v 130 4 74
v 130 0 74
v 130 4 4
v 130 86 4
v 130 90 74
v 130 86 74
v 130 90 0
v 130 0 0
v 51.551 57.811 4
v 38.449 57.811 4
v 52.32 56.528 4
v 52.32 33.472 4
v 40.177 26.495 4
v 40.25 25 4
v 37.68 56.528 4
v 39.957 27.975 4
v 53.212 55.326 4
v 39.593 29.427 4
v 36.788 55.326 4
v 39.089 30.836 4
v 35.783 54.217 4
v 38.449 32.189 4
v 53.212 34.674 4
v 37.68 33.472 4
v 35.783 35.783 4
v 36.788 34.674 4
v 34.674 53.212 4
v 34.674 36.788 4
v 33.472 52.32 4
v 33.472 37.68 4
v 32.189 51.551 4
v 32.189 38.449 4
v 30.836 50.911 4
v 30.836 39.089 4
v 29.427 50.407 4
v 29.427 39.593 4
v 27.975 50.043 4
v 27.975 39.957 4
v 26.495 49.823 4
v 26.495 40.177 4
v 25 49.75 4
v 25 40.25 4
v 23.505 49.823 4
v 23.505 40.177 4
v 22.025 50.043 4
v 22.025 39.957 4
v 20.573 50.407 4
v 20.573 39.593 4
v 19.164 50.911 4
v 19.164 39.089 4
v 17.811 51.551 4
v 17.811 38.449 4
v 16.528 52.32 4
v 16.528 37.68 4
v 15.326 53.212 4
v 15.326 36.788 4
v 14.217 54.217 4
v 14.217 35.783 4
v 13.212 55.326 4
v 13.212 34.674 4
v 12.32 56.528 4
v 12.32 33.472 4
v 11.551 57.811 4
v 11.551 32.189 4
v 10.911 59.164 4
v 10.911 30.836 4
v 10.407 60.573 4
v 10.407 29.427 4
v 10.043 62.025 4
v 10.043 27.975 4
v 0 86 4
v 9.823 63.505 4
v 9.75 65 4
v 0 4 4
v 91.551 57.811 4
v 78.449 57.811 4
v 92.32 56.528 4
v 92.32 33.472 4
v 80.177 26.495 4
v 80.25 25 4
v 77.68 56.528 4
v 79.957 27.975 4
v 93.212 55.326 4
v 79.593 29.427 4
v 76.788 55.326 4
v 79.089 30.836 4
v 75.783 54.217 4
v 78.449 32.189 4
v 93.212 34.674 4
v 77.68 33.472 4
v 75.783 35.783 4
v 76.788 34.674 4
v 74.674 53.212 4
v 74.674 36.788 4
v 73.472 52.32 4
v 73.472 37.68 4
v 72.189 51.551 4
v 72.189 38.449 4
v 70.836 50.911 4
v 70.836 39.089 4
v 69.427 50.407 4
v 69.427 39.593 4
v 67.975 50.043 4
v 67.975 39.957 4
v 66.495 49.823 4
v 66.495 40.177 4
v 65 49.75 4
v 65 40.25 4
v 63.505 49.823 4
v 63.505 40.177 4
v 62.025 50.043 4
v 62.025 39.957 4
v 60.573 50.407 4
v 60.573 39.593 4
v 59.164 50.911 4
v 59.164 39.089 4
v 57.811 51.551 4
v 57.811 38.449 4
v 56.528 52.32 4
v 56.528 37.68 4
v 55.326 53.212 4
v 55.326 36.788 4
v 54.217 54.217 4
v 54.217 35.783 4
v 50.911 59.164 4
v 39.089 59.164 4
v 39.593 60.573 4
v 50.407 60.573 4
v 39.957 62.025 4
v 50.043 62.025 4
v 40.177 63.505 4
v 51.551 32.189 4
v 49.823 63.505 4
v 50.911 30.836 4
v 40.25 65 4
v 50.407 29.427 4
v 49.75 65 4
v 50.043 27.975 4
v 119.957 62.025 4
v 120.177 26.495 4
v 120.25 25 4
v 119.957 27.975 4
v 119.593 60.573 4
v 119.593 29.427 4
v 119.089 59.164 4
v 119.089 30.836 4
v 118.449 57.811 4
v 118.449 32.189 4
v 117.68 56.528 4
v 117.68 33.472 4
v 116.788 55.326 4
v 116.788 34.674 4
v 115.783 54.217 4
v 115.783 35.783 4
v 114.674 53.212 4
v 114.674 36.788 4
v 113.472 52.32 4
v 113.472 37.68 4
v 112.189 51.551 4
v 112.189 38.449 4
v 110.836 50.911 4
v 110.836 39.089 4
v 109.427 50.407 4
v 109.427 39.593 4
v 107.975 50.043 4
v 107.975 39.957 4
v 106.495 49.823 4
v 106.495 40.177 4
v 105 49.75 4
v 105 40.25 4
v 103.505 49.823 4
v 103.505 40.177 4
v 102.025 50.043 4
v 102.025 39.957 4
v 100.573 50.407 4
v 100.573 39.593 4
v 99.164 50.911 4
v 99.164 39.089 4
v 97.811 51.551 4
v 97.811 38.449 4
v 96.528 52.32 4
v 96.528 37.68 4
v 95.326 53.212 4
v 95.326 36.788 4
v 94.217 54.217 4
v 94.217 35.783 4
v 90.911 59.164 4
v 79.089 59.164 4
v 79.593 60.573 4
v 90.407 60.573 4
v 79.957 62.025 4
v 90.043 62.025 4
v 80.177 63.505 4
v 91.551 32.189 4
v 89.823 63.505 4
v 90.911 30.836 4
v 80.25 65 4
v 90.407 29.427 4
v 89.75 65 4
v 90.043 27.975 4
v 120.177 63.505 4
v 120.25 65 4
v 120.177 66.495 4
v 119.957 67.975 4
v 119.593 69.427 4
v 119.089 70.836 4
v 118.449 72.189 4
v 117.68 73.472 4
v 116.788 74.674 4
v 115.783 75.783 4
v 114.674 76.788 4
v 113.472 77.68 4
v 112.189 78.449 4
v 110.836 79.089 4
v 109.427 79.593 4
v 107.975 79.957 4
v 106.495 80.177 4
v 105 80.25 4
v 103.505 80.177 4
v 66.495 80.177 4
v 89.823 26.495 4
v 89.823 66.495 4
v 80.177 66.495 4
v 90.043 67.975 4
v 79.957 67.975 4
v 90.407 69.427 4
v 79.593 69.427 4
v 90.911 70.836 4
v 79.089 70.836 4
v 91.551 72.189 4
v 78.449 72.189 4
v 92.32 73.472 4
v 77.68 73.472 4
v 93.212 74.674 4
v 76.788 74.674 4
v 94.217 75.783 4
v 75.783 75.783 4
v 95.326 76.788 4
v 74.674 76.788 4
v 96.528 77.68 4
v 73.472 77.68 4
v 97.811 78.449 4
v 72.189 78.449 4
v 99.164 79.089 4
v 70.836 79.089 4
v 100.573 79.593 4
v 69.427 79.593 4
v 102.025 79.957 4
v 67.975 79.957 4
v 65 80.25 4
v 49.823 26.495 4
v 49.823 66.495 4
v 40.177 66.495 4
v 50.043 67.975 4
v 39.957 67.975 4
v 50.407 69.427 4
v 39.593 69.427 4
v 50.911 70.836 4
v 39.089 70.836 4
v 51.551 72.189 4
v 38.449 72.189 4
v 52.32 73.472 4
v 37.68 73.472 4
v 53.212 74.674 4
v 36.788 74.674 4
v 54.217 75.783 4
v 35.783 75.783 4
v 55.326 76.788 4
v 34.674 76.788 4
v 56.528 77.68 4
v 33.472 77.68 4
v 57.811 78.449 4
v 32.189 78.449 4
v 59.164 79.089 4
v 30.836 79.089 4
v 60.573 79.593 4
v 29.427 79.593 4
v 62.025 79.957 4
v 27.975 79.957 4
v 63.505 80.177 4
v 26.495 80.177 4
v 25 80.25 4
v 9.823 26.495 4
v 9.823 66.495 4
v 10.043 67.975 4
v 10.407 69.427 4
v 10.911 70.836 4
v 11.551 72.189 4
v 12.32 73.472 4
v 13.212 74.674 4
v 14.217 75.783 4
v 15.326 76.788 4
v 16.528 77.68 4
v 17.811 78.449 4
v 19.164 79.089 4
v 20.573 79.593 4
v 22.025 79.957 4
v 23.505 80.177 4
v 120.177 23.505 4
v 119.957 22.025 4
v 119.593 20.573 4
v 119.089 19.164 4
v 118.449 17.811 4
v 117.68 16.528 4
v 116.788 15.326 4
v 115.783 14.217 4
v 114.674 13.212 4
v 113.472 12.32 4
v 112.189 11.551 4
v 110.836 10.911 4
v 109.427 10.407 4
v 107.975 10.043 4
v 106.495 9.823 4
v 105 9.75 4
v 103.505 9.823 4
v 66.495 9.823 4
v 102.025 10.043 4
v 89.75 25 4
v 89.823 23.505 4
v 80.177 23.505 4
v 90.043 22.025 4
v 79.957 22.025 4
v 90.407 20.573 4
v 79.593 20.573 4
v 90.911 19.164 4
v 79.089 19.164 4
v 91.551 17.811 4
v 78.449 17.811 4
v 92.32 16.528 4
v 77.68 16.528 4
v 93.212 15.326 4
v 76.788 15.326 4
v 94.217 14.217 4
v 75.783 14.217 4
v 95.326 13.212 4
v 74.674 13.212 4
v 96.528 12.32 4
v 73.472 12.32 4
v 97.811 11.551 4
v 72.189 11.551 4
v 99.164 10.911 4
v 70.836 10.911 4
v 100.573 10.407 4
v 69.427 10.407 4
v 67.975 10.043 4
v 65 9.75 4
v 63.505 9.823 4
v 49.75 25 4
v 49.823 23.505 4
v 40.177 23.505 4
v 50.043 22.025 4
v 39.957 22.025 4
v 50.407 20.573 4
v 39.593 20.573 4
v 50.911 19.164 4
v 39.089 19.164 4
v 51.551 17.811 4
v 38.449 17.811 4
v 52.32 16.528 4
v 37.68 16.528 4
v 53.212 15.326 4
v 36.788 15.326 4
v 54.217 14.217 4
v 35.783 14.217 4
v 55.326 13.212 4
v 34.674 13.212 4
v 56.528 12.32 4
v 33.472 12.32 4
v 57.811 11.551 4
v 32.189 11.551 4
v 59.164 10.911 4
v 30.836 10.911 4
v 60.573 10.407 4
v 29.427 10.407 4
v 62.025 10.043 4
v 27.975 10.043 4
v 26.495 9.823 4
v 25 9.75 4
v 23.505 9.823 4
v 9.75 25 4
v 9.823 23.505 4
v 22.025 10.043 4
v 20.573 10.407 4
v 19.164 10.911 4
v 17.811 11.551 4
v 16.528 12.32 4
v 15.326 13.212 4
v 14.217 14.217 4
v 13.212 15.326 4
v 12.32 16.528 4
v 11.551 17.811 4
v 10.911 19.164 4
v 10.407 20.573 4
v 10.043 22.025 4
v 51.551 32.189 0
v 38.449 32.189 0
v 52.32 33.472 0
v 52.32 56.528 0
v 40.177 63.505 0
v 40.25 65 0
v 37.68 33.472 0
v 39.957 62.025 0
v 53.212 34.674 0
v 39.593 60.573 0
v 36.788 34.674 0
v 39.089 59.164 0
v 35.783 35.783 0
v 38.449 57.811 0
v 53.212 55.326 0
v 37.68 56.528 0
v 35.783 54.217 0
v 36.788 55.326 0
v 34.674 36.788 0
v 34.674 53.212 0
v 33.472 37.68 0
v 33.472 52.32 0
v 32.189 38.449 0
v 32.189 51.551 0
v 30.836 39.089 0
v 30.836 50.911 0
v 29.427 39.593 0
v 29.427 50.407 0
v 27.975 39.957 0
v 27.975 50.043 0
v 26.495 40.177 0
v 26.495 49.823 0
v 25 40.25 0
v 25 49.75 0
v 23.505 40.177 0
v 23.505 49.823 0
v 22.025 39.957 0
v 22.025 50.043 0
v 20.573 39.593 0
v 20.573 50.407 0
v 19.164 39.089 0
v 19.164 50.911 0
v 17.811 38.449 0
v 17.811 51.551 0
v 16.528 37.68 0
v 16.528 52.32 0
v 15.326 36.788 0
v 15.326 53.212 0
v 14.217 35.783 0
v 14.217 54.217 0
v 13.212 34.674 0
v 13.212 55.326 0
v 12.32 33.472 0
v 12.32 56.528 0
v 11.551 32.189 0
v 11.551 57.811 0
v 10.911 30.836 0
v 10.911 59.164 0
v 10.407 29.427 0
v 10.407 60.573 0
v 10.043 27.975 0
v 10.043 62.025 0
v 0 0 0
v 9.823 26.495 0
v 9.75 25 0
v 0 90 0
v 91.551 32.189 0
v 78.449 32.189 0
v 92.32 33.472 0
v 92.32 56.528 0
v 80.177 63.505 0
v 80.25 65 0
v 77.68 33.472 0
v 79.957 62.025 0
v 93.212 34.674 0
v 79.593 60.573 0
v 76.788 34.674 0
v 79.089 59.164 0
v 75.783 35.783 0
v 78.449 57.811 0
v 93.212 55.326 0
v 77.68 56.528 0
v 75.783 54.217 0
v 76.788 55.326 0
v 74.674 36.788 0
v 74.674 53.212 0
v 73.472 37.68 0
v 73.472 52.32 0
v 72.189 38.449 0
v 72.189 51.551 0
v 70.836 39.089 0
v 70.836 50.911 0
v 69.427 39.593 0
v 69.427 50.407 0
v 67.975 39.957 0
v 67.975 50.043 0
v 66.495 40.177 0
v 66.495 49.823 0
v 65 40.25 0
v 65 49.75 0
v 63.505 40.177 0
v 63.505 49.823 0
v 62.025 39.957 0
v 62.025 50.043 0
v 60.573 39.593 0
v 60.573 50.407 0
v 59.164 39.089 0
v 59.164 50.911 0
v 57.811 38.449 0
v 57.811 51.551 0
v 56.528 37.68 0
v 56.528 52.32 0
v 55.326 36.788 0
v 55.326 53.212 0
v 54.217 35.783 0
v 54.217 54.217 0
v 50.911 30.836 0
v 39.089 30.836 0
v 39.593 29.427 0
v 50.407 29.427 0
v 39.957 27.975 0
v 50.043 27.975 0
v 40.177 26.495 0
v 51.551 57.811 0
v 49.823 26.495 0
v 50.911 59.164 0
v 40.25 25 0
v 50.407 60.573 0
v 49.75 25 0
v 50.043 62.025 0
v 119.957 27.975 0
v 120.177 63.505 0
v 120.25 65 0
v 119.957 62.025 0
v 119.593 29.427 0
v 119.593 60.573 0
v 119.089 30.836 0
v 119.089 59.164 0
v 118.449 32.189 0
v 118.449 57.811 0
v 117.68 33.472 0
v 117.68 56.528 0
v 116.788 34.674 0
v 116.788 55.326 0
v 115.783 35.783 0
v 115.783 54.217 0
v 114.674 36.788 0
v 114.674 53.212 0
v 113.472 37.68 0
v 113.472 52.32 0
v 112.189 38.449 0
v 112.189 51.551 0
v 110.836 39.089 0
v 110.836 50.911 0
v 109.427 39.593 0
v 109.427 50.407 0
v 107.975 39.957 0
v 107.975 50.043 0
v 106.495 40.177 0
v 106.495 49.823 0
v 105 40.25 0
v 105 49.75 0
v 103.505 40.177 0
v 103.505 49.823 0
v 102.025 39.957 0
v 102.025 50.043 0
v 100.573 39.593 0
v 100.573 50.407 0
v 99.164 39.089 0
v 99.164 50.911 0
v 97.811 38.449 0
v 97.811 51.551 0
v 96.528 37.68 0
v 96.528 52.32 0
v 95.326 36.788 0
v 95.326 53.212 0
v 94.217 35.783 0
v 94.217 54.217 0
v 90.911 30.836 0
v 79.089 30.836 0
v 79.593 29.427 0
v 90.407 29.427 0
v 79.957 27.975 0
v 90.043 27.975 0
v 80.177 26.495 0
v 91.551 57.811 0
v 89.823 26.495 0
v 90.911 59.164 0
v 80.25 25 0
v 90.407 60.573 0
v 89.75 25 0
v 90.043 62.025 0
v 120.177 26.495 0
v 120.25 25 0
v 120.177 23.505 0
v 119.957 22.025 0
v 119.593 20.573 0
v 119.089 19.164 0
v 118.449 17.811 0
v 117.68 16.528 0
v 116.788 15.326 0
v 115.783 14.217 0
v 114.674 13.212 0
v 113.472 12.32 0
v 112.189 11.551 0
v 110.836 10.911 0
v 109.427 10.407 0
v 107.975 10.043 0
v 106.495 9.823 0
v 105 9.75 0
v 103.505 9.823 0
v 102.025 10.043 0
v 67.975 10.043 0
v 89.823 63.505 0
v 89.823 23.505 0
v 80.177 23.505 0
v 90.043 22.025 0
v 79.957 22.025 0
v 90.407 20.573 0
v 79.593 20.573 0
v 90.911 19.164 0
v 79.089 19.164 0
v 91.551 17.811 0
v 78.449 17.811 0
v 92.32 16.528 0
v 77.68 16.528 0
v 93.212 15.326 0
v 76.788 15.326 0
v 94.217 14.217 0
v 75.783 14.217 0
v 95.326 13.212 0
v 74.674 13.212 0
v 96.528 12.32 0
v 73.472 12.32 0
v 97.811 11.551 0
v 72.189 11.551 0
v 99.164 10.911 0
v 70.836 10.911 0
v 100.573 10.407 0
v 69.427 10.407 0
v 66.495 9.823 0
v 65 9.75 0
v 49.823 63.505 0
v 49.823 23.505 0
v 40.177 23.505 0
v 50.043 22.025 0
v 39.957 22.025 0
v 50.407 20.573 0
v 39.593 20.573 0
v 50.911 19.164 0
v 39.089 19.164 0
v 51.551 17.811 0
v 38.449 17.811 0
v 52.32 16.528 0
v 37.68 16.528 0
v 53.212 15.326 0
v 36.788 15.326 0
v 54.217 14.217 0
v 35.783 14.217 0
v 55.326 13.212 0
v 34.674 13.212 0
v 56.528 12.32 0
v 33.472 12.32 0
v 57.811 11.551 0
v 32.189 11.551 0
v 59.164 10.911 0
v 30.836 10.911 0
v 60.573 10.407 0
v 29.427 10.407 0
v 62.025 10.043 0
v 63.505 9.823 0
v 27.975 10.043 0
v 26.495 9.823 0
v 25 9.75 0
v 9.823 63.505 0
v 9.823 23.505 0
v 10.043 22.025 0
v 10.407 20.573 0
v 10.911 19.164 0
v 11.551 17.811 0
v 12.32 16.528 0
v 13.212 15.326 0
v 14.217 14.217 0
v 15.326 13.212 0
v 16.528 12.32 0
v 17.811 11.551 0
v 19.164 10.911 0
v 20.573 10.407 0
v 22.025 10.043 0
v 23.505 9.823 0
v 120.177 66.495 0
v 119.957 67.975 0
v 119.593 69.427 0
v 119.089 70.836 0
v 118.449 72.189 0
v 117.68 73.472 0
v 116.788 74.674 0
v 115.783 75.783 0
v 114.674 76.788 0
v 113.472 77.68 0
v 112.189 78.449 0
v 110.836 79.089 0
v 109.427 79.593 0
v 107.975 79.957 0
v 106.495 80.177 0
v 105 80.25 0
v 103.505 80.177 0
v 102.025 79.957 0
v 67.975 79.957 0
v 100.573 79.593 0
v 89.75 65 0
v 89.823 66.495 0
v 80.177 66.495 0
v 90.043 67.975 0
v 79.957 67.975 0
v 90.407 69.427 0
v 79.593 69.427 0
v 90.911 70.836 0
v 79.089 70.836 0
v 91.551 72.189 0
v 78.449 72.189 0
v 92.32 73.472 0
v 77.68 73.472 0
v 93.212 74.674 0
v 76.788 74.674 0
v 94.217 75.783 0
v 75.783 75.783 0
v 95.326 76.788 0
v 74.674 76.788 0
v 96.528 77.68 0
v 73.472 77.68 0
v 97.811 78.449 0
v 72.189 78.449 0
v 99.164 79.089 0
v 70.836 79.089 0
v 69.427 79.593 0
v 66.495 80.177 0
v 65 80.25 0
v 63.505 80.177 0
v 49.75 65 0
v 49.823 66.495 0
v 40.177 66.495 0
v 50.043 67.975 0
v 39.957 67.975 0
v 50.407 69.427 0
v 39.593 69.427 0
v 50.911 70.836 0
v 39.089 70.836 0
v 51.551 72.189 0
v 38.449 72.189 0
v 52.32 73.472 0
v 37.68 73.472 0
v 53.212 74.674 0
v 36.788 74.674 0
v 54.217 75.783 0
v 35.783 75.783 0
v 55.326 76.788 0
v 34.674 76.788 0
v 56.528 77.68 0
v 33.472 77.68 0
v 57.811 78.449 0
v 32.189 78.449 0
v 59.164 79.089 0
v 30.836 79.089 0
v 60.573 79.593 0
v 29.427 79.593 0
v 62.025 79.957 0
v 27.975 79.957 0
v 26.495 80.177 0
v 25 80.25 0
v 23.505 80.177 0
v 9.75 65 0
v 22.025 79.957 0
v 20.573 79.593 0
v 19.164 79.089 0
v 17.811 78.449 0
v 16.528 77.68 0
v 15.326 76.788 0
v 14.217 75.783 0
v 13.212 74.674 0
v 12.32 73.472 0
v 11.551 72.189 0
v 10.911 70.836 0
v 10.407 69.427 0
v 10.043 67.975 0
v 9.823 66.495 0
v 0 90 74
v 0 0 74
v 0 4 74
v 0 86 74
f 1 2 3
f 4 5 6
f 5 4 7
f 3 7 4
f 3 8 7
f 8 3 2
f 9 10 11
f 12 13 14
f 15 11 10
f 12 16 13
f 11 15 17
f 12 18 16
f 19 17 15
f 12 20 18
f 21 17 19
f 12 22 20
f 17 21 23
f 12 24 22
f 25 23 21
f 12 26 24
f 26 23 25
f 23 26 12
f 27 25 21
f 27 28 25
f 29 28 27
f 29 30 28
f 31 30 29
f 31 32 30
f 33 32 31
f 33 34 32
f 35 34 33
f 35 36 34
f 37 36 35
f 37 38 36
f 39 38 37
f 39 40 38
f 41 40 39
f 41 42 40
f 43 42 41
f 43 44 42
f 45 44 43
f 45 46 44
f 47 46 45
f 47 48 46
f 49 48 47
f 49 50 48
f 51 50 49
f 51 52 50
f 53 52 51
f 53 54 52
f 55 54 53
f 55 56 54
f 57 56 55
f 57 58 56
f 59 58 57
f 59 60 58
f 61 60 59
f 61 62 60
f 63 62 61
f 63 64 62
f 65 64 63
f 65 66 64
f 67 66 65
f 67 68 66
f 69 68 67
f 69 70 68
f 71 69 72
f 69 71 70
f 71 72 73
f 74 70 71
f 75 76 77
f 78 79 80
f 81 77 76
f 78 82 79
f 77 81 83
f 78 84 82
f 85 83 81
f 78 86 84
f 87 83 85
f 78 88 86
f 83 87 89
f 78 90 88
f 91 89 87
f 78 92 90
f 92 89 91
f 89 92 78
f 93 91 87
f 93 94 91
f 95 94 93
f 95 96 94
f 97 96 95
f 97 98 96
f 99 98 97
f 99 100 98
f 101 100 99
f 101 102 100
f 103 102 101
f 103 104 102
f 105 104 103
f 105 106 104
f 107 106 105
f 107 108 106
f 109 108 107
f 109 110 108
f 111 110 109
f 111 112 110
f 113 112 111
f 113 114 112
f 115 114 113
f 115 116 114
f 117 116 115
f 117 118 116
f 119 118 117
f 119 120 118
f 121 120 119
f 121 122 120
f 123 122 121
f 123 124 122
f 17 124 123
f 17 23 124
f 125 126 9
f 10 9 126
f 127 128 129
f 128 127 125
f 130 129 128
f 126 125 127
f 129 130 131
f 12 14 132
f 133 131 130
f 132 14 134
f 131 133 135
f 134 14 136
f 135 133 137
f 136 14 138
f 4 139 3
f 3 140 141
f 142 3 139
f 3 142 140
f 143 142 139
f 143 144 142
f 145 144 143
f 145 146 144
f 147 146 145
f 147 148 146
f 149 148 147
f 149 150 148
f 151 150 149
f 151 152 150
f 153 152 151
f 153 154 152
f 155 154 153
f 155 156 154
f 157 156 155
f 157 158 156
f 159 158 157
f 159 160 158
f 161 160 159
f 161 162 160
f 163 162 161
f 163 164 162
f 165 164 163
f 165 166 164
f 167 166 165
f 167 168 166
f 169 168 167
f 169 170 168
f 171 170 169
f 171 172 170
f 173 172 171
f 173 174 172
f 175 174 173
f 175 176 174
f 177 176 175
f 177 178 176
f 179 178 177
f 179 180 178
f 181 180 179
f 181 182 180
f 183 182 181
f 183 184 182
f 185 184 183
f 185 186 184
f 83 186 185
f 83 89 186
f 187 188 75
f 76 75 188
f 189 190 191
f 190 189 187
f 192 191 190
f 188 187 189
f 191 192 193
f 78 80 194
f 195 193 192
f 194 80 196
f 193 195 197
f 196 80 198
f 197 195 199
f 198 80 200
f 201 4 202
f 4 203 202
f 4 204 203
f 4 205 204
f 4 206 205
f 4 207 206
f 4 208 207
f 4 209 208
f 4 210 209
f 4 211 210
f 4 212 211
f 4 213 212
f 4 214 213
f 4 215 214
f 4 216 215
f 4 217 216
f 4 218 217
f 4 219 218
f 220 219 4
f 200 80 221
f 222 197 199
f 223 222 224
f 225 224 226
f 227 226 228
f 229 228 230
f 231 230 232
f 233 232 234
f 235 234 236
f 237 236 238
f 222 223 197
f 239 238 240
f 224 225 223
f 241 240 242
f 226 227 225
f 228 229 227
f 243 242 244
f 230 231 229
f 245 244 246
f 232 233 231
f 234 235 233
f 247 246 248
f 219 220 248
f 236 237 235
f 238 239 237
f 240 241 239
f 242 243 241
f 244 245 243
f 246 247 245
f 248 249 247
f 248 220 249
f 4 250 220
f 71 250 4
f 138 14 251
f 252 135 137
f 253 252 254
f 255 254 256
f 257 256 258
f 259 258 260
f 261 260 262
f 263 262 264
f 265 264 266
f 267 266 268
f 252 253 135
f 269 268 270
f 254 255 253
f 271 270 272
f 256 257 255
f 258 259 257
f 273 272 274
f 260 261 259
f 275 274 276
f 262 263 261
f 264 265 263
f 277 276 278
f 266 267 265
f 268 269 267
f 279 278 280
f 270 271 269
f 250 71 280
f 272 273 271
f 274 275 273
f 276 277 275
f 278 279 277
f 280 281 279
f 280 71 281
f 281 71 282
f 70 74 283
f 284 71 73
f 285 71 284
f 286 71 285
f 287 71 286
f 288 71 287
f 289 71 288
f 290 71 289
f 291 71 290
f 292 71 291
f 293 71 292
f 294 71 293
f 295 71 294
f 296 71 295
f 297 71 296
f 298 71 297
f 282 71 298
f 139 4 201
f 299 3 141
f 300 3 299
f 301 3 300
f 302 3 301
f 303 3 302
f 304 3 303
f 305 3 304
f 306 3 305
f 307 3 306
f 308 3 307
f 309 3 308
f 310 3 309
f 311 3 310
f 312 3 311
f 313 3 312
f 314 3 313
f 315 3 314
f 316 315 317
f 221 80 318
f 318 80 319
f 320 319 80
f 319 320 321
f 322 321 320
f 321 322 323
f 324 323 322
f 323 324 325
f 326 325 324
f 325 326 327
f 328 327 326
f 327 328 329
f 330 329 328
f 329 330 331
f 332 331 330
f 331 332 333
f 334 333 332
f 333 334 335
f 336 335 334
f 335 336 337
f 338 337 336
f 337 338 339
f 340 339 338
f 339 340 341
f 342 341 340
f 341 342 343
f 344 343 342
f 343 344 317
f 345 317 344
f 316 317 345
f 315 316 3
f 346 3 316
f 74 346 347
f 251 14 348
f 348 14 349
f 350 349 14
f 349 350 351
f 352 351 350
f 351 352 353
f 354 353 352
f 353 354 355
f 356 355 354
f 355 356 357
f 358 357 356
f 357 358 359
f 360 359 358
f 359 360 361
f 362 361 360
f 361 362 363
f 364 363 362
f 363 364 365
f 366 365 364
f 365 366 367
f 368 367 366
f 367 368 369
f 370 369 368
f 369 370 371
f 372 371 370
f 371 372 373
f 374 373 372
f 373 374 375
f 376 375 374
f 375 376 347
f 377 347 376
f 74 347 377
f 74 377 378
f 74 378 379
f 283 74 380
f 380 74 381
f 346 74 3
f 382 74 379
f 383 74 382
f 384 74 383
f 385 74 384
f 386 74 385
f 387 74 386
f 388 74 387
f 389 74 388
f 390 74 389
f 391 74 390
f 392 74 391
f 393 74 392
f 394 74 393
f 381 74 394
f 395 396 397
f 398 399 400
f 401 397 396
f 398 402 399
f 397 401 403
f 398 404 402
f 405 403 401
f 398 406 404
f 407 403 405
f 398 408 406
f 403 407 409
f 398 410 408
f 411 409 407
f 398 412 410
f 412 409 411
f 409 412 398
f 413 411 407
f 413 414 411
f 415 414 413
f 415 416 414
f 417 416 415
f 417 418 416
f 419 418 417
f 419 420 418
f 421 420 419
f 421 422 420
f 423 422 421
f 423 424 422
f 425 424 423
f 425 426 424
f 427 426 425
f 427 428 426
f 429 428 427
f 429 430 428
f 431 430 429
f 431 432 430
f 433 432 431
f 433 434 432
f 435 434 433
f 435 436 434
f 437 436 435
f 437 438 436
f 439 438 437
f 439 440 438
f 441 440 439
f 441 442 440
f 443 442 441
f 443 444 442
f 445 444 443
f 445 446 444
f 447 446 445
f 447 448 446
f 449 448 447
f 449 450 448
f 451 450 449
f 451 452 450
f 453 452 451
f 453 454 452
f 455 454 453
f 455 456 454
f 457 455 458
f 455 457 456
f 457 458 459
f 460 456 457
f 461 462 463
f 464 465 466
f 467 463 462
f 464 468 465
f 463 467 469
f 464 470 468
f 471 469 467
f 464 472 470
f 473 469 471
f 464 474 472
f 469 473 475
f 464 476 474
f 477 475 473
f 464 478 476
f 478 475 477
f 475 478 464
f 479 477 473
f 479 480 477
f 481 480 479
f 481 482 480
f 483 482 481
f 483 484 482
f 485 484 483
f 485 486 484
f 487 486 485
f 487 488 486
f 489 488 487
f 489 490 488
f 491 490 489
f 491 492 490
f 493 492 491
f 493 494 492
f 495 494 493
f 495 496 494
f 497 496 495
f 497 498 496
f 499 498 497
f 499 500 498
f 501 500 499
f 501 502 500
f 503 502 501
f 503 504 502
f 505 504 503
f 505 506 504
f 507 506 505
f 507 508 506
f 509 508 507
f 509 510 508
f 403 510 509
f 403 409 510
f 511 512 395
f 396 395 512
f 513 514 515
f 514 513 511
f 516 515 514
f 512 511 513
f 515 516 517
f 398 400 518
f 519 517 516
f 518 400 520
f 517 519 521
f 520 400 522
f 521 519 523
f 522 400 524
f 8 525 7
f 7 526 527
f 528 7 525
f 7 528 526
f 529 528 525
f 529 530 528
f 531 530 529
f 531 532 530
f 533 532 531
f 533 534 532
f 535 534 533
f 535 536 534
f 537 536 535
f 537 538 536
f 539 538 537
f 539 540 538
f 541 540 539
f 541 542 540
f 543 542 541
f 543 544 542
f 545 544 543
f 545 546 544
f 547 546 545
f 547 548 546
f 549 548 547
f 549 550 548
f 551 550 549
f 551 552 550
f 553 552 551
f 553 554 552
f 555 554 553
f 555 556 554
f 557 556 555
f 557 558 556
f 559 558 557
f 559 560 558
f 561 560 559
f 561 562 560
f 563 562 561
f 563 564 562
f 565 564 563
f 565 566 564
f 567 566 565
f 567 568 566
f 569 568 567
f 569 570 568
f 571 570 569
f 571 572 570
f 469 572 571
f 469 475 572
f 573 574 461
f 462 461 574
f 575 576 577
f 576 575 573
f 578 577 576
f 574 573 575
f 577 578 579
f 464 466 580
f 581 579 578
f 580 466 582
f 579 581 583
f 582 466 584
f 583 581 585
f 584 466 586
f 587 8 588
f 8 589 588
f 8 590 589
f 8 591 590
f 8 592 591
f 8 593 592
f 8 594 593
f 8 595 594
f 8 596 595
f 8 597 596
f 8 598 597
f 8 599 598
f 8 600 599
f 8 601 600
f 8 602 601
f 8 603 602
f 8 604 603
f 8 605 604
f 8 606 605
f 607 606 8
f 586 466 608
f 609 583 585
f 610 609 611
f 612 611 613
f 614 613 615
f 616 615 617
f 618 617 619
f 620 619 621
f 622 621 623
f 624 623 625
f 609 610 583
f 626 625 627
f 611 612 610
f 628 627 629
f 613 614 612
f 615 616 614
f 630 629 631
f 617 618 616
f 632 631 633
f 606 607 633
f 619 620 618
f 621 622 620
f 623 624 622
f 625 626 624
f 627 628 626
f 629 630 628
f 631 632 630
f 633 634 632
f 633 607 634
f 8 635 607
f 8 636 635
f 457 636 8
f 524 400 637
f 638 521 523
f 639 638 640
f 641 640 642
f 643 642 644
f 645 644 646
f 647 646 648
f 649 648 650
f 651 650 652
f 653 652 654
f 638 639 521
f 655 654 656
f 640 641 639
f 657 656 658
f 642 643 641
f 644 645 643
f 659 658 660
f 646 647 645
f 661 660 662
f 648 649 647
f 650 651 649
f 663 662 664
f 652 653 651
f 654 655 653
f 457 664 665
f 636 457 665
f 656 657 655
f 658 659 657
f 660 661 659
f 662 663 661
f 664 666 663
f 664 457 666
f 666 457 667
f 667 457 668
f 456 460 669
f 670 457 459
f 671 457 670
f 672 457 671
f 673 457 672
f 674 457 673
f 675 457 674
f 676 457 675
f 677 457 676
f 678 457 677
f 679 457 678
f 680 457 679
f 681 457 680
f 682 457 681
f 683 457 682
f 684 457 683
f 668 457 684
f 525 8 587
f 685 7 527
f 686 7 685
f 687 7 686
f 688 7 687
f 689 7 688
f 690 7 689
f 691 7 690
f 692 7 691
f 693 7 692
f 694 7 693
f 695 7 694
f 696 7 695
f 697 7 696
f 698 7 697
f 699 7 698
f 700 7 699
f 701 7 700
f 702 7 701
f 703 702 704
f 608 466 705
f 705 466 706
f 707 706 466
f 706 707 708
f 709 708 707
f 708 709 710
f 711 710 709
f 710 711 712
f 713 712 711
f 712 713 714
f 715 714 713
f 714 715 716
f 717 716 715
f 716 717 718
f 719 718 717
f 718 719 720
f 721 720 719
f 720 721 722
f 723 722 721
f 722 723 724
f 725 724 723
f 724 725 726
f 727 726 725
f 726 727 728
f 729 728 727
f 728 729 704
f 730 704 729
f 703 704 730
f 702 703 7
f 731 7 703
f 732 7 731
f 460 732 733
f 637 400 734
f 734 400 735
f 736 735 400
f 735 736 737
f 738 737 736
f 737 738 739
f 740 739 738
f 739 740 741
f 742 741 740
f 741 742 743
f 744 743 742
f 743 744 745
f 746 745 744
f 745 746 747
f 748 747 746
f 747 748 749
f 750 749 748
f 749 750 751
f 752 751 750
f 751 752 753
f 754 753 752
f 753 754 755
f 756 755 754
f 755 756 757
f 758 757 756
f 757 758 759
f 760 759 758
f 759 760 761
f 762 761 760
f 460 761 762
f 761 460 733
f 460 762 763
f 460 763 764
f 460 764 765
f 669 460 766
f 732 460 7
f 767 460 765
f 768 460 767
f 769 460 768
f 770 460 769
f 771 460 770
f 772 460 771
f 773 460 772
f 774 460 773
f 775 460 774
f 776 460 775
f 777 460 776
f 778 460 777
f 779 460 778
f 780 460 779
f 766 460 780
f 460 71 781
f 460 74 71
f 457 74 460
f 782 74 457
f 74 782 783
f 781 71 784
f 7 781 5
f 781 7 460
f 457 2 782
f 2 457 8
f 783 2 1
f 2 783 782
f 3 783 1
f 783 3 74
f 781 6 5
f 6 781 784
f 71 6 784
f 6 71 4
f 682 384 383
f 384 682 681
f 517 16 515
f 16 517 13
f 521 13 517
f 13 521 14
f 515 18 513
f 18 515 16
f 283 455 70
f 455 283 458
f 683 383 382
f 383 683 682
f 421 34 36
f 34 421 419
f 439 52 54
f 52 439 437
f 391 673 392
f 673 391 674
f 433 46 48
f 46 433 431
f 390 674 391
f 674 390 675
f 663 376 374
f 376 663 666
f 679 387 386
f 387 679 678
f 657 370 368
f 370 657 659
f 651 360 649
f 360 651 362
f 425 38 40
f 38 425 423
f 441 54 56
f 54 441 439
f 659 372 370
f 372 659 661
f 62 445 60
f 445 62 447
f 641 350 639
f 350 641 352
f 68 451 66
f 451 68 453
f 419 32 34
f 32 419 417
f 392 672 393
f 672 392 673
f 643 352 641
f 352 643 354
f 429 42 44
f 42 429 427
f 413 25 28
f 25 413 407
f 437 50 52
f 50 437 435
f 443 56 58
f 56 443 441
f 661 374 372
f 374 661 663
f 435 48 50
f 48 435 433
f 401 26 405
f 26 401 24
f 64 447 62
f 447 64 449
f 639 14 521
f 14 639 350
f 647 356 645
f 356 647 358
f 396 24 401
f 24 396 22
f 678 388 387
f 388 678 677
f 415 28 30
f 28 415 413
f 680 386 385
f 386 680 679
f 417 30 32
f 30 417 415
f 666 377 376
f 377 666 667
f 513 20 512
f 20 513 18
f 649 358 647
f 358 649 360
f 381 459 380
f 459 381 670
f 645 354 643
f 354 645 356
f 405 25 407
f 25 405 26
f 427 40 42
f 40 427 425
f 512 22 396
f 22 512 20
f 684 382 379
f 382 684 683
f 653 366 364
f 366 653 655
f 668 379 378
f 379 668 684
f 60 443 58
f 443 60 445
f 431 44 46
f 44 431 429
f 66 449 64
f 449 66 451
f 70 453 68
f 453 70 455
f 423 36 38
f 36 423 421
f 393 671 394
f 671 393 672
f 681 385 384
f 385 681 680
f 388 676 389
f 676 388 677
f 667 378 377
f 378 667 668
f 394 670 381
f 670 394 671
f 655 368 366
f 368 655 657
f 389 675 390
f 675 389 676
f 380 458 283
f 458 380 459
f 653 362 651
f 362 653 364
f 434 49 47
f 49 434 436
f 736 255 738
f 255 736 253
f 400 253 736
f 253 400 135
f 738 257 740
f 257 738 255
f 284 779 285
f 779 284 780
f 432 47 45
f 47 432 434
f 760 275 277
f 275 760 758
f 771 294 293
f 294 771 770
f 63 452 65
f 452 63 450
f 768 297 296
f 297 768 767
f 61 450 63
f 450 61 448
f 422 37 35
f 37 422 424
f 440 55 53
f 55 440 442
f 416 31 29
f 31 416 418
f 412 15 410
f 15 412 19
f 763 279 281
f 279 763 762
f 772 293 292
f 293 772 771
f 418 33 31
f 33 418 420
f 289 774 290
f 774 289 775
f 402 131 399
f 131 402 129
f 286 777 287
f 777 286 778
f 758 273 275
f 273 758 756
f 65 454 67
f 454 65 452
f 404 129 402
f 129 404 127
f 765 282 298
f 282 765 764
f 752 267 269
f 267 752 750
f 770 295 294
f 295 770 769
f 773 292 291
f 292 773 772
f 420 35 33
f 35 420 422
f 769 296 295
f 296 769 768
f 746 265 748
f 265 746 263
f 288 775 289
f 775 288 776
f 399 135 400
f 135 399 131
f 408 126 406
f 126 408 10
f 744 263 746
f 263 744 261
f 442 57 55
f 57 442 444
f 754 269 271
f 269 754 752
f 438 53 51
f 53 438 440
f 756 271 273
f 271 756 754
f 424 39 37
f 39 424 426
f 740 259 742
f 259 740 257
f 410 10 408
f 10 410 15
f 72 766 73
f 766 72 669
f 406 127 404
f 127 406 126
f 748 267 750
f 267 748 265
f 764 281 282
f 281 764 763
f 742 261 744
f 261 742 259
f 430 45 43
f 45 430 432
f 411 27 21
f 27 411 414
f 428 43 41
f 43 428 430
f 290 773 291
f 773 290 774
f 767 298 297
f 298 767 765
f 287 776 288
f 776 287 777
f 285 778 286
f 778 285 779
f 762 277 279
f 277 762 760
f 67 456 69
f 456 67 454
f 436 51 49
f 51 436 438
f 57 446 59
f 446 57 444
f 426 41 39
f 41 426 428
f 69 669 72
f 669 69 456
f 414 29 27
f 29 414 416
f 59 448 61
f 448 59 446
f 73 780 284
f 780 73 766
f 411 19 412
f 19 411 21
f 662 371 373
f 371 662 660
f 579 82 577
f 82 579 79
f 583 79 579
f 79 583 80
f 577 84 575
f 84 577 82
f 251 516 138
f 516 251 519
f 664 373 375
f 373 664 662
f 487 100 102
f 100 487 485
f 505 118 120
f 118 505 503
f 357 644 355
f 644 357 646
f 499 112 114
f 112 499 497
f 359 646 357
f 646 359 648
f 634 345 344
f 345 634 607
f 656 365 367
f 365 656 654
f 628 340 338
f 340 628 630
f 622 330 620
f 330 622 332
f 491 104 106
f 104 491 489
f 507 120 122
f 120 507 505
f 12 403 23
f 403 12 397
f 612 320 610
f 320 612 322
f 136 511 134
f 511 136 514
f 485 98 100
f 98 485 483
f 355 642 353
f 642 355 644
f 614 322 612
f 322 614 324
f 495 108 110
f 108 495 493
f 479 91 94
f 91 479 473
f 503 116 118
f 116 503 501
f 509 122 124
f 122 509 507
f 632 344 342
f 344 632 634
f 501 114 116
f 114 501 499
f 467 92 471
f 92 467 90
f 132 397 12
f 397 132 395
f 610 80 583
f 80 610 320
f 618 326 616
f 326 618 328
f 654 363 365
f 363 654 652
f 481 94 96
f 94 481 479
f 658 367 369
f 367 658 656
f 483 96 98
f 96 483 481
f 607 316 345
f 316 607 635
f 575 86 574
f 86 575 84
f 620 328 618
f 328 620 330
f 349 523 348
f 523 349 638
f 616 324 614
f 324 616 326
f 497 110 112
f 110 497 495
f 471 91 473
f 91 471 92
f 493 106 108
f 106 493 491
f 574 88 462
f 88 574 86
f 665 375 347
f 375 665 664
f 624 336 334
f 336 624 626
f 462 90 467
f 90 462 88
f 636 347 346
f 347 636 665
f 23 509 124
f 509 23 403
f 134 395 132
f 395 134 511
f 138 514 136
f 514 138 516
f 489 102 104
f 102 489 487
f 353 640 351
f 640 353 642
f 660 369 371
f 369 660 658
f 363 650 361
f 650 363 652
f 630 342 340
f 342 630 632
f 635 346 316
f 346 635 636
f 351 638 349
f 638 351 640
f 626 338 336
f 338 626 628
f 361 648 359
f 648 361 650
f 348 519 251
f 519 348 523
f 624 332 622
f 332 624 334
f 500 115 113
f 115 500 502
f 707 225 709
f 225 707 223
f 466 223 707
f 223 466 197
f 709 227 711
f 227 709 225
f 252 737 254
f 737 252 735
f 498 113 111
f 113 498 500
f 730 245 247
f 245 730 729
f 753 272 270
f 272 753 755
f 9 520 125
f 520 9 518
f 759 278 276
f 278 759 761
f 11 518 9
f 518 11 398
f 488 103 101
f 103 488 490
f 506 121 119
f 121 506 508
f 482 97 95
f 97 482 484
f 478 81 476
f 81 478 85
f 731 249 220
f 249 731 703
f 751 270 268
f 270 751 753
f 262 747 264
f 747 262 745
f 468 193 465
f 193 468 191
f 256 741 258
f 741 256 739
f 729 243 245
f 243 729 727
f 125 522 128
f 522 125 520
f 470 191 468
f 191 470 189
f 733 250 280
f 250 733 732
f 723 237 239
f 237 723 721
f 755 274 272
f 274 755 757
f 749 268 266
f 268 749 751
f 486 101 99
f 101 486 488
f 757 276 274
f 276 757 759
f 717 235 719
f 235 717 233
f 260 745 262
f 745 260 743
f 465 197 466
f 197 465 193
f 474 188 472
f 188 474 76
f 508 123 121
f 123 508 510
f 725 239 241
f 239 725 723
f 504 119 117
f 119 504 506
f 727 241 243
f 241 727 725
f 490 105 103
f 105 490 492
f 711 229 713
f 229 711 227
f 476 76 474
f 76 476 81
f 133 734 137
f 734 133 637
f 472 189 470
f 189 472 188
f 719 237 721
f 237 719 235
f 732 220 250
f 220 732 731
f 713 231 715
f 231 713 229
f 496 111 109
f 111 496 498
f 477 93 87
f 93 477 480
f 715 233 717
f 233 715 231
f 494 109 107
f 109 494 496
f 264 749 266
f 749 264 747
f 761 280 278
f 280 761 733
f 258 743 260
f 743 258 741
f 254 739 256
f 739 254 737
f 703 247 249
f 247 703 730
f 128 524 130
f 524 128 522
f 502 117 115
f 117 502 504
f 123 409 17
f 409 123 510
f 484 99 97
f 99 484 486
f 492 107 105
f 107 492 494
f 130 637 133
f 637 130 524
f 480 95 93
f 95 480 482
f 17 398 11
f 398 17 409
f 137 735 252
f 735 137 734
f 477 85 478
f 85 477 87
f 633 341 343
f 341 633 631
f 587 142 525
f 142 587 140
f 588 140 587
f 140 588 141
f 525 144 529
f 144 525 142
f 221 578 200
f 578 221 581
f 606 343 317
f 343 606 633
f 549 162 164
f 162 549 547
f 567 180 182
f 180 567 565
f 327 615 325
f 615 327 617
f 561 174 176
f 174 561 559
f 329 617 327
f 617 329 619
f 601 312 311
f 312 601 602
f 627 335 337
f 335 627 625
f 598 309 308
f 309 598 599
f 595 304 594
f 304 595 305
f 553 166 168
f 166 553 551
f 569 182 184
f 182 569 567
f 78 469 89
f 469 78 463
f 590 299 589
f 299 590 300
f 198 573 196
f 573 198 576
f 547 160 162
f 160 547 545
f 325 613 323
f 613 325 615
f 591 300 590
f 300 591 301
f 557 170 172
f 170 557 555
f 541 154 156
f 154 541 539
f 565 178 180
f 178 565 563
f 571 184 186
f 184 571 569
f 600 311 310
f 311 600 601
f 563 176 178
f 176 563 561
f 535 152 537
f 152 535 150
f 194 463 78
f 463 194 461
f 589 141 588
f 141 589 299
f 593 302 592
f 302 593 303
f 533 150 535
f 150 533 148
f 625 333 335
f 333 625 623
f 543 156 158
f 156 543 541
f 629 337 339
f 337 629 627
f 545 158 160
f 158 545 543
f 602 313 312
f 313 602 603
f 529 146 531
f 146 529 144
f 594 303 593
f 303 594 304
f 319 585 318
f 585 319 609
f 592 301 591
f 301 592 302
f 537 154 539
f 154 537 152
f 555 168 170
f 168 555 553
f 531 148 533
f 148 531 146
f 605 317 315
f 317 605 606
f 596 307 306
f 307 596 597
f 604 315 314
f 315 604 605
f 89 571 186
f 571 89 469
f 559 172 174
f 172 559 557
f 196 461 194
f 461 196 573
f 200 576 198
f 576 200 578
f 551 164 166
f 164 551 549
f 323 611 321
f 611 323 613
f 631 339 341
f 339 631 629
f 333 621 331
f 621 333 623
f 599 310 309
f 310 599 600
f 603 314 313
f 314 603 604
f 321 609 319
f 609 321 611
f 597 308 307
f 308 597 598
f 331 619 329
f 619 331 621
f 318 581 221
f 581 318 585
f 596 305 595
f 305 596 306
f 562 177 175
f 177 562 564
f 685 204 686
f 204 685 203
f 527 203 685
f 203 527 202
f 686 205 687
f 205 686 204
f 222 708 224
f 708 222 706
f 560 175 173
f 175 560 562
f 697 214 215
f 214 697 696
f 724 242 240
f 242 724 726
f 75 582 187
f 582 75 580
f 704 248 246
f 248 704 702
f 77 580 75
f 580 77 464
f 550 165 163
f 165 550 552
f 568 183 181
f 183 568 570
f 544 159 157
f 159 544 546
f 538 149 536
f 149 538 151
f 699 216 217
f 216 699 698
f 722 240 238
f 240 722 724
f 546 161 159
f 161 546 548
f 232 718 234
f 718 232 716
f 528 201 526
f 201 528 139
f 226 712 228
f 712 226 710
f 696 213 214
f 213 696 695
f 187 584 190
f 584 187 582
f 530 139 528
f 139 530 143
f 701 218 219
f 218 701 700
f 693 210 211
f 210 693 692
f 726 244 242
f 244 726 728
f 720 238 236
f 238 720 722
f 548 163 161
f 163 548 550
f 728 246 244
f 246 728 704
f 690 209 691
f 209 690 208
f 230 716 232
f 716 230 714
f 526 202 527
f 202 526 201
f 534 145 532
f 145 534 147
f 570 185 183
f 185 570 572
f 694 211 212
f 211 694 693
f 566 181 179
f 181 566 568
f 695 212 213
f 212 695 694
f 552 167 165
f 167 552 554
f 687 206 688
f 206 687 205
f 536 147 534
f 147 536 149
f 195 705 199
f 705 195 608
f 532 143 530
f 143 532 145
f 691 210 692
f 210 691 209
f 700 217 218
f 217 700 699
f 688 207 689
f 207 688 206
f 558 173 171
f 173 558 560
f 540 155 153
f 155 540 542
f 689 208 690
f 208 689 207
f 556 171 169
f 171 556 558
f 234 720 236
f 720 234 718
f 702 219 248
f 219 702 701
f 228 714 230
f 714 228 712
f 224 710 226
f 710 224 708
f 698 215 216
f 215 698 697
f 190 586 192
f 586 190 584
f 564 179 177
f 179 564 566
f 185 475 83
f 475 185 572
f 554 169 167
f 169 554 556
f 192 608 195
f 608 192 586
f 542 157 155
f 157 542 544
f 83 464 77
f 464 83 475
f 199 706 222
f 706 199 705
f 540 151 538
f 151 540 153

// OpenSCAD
// --- Dimensions (mm) ---
plate_width = 130;          // X dimension of the base plate
plate_depth = 90;           // Y dimension of the base plate
plate_thickness = 4;        // Thickness of the base plate
wall_height = 70;           // Height of the side walls from the plate
wall_thickness = 4;         // Thickness of the side walls
hole_diameter = 30.5;       // Diameter of the tube holes
hole_spacing_x = 40;        // Center-to-center distance along X
hole_spacing_y = 40;        // Center-to-center distance along Y
num_holes_x = 3;            // Number of holes along X axis
num_holes_y = 2;            // Number of holes along Y axis

// --- Resolution ---
$fn = 64;

// --- Construction ---

// The part is designed to be printed "upside down" relative to its final use.
// In print orientation: 
// The plate is at Z=0 to Z=4.
// The walls rise from Z=4 to Z=74 (4 + 70).
// The holes are cut through the plate.

module tube_rack() {
    difference() {
        // Main Body: The plate and the two side walls
        union() {
            // The Base Plate
            cube([plate_width, plate_depth, plate_thickness]);
            
            // Wall 1 (along one long edge)
            // Positioned at Y=0 to Y=4
            translate([0, 0, plate_thickness])
                cube([plate_width, wall_thickness, wall_height]);
            
            // Wall 2 (along the other long edge)
            // Positioned at Y=86 to Y=90 (90 - 4)
            translate([0, plate_depth - wall_thickness, plate_thickness])
                cube([plate_width, wall_thickness, wall_height]);
        }

        // The Holes
        // Grid center is at (plate_width/2, plate_depth/2)
        // Offset calculation: (Total_spacing - (count-1)*spacing) / 2
        start_x = (plate_width - (num_holes_x - 1) * hole_spacing_x) / 2;
        start_y = (plate_depth - (num_holes_y - 1) * hole_spacing_y) / 2;

        for (i = [0 : num_holes_x - 1]) {
            for (j = [0 : num_holes_y - 1]) {
                translate([
                    start_x + i * hole_spacing_x, 
                    start_y + j * hole_spacing_y, 
                    -0.01 // Slight overlap to ensure clean cut through bottom
                ])
                cylinder(d = hole_diameter, h = plate_thickness + 0.02);
            }
        }
    }
}

// Render the part
tube_rack();
